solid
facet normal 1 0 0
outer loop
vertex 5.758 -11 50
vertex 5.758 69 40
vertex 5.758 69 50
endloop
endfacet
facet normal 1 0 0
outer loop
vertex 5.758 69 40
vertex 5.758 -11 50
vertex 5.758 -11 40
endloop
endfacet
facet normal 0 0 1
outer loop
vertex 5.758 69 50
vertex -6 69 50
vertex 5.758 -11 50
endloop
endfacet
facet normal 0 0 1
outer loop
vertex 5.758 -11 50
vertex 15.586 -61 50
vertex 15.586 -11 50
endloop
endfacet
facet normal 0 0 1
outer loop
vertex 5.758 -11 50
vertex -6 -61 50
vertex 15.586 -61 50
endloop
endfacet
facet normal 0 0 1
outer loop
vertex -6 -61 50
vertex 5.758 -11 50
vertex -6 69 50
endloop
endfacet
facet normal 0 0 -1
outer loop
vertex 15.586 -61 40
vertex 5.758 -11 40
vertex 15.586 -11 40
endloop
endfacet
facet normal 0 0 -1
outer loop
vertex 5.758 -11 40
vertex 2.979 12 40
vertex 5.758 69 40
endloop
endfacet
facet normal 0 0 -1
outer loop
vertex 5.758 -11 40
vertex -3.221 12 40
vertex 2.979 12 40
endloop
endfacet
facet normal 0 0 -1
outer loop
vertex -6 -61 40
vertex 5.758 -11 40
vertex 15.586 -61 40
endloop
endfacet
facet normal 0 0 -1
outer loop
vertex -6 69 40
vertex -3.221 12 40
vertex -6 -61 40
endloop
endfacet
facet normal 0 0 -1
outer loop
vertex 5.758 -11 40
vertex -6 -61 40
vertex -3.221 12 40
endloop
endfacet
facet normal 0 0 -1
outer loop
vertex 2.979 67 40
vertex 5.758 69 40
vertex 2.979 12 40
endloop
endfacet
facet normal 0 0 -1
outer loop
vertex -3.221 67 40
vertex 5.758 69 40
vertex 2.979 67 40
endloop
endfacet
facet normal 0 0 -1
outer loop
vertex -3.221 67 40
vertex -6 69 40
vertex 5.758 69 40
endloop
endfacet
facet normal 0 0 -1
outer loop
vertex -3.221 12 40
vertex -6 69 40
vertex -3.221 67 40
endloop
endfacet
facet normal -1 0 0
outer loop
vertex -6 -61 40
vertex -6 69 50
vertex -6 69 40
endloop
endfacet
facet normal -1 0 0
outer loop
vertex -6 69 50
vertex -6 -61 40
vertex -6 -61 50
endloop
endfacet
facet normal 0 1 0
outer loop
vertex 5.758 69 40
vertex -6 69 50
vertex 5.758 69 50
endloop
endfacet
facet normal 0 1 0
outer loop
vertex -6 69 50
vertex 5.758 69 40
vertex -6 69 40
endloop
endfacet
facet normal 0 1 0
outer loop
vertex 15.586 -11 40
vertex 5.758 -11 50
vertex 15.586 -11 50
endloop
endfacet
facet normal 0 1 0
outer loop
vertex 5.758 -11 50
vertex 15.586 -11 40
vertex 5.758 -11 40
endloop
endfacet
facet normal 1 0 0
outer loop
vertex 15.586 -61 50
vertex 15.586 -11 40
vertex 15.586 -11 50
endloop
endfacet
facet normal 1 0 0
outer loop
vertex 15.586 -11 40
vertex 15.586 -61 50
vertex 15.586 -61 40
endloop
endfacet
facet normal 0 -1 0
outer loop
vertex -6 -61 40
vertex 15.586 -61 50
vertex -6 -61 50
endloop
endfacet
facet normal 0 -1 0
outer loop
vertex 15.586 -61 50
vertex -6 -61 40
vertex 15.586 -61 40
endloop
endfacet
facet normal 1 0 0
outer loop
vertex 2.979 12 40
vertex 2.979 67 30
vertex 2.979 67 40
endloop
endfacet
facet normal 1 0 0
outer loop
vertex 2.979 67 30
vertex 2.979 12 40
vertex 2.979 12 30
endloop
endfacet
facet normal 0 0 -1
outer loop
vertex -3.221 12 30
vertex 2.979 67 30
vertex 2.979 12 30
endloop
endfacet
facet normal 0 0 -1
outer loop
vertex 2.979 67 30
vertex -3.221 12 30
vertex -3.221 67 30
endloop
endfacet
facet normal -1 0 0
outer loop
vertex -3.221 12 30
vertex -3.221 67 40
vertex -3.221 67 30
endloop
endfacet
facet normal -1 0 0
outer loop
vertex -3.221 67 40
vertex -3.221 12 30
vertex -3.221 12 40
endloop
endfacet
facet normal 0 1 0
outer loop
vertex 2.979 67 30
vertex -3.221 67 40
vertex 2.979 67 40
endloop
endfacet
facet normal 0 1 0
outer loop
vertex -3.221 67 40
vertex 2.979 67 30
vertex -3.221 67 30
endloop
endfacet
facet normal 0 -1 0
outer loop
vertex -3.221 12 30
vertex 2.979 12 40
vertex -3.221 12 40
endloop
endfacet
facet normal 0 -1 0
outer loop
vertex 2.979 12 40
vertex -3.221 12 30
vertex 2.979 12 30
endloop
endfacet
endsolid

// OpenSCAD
xO = -6;
yO = -11;
zO = 40;

kH = 10;
bH = 10;
wL = 50;
bL = 80;
oct = 6.5 * 25.4;
gap = 2;
n_oct = 1;
n_keys = 12;
oset = -1;

kn = 2;

sharpFlag = 0;//1;

ifD = 0;
ifE = 0;
ifF = 0;
ifG = 0;
ifA = 0;
ifB = 0;

k = 0;
//C:
color("ivory") translate([k*oct+0+xO,0+yO,0+zO]) cube([oct*1/12-gap,bL,kH]);
color("ivory") translate([k*oct+0+xO,-wL+yO,0+zO]) cube([oct*1/7-gap,wL,kH]);
//}

for (i = [0]){
    translate([oset+oct*i/12+(oct*1/12-6.2)/2+xO+0*oct,2+10+yO+12+3-4,-10+zO]) cube([6.2,bL-10-7-12-4+8,10]);
}
